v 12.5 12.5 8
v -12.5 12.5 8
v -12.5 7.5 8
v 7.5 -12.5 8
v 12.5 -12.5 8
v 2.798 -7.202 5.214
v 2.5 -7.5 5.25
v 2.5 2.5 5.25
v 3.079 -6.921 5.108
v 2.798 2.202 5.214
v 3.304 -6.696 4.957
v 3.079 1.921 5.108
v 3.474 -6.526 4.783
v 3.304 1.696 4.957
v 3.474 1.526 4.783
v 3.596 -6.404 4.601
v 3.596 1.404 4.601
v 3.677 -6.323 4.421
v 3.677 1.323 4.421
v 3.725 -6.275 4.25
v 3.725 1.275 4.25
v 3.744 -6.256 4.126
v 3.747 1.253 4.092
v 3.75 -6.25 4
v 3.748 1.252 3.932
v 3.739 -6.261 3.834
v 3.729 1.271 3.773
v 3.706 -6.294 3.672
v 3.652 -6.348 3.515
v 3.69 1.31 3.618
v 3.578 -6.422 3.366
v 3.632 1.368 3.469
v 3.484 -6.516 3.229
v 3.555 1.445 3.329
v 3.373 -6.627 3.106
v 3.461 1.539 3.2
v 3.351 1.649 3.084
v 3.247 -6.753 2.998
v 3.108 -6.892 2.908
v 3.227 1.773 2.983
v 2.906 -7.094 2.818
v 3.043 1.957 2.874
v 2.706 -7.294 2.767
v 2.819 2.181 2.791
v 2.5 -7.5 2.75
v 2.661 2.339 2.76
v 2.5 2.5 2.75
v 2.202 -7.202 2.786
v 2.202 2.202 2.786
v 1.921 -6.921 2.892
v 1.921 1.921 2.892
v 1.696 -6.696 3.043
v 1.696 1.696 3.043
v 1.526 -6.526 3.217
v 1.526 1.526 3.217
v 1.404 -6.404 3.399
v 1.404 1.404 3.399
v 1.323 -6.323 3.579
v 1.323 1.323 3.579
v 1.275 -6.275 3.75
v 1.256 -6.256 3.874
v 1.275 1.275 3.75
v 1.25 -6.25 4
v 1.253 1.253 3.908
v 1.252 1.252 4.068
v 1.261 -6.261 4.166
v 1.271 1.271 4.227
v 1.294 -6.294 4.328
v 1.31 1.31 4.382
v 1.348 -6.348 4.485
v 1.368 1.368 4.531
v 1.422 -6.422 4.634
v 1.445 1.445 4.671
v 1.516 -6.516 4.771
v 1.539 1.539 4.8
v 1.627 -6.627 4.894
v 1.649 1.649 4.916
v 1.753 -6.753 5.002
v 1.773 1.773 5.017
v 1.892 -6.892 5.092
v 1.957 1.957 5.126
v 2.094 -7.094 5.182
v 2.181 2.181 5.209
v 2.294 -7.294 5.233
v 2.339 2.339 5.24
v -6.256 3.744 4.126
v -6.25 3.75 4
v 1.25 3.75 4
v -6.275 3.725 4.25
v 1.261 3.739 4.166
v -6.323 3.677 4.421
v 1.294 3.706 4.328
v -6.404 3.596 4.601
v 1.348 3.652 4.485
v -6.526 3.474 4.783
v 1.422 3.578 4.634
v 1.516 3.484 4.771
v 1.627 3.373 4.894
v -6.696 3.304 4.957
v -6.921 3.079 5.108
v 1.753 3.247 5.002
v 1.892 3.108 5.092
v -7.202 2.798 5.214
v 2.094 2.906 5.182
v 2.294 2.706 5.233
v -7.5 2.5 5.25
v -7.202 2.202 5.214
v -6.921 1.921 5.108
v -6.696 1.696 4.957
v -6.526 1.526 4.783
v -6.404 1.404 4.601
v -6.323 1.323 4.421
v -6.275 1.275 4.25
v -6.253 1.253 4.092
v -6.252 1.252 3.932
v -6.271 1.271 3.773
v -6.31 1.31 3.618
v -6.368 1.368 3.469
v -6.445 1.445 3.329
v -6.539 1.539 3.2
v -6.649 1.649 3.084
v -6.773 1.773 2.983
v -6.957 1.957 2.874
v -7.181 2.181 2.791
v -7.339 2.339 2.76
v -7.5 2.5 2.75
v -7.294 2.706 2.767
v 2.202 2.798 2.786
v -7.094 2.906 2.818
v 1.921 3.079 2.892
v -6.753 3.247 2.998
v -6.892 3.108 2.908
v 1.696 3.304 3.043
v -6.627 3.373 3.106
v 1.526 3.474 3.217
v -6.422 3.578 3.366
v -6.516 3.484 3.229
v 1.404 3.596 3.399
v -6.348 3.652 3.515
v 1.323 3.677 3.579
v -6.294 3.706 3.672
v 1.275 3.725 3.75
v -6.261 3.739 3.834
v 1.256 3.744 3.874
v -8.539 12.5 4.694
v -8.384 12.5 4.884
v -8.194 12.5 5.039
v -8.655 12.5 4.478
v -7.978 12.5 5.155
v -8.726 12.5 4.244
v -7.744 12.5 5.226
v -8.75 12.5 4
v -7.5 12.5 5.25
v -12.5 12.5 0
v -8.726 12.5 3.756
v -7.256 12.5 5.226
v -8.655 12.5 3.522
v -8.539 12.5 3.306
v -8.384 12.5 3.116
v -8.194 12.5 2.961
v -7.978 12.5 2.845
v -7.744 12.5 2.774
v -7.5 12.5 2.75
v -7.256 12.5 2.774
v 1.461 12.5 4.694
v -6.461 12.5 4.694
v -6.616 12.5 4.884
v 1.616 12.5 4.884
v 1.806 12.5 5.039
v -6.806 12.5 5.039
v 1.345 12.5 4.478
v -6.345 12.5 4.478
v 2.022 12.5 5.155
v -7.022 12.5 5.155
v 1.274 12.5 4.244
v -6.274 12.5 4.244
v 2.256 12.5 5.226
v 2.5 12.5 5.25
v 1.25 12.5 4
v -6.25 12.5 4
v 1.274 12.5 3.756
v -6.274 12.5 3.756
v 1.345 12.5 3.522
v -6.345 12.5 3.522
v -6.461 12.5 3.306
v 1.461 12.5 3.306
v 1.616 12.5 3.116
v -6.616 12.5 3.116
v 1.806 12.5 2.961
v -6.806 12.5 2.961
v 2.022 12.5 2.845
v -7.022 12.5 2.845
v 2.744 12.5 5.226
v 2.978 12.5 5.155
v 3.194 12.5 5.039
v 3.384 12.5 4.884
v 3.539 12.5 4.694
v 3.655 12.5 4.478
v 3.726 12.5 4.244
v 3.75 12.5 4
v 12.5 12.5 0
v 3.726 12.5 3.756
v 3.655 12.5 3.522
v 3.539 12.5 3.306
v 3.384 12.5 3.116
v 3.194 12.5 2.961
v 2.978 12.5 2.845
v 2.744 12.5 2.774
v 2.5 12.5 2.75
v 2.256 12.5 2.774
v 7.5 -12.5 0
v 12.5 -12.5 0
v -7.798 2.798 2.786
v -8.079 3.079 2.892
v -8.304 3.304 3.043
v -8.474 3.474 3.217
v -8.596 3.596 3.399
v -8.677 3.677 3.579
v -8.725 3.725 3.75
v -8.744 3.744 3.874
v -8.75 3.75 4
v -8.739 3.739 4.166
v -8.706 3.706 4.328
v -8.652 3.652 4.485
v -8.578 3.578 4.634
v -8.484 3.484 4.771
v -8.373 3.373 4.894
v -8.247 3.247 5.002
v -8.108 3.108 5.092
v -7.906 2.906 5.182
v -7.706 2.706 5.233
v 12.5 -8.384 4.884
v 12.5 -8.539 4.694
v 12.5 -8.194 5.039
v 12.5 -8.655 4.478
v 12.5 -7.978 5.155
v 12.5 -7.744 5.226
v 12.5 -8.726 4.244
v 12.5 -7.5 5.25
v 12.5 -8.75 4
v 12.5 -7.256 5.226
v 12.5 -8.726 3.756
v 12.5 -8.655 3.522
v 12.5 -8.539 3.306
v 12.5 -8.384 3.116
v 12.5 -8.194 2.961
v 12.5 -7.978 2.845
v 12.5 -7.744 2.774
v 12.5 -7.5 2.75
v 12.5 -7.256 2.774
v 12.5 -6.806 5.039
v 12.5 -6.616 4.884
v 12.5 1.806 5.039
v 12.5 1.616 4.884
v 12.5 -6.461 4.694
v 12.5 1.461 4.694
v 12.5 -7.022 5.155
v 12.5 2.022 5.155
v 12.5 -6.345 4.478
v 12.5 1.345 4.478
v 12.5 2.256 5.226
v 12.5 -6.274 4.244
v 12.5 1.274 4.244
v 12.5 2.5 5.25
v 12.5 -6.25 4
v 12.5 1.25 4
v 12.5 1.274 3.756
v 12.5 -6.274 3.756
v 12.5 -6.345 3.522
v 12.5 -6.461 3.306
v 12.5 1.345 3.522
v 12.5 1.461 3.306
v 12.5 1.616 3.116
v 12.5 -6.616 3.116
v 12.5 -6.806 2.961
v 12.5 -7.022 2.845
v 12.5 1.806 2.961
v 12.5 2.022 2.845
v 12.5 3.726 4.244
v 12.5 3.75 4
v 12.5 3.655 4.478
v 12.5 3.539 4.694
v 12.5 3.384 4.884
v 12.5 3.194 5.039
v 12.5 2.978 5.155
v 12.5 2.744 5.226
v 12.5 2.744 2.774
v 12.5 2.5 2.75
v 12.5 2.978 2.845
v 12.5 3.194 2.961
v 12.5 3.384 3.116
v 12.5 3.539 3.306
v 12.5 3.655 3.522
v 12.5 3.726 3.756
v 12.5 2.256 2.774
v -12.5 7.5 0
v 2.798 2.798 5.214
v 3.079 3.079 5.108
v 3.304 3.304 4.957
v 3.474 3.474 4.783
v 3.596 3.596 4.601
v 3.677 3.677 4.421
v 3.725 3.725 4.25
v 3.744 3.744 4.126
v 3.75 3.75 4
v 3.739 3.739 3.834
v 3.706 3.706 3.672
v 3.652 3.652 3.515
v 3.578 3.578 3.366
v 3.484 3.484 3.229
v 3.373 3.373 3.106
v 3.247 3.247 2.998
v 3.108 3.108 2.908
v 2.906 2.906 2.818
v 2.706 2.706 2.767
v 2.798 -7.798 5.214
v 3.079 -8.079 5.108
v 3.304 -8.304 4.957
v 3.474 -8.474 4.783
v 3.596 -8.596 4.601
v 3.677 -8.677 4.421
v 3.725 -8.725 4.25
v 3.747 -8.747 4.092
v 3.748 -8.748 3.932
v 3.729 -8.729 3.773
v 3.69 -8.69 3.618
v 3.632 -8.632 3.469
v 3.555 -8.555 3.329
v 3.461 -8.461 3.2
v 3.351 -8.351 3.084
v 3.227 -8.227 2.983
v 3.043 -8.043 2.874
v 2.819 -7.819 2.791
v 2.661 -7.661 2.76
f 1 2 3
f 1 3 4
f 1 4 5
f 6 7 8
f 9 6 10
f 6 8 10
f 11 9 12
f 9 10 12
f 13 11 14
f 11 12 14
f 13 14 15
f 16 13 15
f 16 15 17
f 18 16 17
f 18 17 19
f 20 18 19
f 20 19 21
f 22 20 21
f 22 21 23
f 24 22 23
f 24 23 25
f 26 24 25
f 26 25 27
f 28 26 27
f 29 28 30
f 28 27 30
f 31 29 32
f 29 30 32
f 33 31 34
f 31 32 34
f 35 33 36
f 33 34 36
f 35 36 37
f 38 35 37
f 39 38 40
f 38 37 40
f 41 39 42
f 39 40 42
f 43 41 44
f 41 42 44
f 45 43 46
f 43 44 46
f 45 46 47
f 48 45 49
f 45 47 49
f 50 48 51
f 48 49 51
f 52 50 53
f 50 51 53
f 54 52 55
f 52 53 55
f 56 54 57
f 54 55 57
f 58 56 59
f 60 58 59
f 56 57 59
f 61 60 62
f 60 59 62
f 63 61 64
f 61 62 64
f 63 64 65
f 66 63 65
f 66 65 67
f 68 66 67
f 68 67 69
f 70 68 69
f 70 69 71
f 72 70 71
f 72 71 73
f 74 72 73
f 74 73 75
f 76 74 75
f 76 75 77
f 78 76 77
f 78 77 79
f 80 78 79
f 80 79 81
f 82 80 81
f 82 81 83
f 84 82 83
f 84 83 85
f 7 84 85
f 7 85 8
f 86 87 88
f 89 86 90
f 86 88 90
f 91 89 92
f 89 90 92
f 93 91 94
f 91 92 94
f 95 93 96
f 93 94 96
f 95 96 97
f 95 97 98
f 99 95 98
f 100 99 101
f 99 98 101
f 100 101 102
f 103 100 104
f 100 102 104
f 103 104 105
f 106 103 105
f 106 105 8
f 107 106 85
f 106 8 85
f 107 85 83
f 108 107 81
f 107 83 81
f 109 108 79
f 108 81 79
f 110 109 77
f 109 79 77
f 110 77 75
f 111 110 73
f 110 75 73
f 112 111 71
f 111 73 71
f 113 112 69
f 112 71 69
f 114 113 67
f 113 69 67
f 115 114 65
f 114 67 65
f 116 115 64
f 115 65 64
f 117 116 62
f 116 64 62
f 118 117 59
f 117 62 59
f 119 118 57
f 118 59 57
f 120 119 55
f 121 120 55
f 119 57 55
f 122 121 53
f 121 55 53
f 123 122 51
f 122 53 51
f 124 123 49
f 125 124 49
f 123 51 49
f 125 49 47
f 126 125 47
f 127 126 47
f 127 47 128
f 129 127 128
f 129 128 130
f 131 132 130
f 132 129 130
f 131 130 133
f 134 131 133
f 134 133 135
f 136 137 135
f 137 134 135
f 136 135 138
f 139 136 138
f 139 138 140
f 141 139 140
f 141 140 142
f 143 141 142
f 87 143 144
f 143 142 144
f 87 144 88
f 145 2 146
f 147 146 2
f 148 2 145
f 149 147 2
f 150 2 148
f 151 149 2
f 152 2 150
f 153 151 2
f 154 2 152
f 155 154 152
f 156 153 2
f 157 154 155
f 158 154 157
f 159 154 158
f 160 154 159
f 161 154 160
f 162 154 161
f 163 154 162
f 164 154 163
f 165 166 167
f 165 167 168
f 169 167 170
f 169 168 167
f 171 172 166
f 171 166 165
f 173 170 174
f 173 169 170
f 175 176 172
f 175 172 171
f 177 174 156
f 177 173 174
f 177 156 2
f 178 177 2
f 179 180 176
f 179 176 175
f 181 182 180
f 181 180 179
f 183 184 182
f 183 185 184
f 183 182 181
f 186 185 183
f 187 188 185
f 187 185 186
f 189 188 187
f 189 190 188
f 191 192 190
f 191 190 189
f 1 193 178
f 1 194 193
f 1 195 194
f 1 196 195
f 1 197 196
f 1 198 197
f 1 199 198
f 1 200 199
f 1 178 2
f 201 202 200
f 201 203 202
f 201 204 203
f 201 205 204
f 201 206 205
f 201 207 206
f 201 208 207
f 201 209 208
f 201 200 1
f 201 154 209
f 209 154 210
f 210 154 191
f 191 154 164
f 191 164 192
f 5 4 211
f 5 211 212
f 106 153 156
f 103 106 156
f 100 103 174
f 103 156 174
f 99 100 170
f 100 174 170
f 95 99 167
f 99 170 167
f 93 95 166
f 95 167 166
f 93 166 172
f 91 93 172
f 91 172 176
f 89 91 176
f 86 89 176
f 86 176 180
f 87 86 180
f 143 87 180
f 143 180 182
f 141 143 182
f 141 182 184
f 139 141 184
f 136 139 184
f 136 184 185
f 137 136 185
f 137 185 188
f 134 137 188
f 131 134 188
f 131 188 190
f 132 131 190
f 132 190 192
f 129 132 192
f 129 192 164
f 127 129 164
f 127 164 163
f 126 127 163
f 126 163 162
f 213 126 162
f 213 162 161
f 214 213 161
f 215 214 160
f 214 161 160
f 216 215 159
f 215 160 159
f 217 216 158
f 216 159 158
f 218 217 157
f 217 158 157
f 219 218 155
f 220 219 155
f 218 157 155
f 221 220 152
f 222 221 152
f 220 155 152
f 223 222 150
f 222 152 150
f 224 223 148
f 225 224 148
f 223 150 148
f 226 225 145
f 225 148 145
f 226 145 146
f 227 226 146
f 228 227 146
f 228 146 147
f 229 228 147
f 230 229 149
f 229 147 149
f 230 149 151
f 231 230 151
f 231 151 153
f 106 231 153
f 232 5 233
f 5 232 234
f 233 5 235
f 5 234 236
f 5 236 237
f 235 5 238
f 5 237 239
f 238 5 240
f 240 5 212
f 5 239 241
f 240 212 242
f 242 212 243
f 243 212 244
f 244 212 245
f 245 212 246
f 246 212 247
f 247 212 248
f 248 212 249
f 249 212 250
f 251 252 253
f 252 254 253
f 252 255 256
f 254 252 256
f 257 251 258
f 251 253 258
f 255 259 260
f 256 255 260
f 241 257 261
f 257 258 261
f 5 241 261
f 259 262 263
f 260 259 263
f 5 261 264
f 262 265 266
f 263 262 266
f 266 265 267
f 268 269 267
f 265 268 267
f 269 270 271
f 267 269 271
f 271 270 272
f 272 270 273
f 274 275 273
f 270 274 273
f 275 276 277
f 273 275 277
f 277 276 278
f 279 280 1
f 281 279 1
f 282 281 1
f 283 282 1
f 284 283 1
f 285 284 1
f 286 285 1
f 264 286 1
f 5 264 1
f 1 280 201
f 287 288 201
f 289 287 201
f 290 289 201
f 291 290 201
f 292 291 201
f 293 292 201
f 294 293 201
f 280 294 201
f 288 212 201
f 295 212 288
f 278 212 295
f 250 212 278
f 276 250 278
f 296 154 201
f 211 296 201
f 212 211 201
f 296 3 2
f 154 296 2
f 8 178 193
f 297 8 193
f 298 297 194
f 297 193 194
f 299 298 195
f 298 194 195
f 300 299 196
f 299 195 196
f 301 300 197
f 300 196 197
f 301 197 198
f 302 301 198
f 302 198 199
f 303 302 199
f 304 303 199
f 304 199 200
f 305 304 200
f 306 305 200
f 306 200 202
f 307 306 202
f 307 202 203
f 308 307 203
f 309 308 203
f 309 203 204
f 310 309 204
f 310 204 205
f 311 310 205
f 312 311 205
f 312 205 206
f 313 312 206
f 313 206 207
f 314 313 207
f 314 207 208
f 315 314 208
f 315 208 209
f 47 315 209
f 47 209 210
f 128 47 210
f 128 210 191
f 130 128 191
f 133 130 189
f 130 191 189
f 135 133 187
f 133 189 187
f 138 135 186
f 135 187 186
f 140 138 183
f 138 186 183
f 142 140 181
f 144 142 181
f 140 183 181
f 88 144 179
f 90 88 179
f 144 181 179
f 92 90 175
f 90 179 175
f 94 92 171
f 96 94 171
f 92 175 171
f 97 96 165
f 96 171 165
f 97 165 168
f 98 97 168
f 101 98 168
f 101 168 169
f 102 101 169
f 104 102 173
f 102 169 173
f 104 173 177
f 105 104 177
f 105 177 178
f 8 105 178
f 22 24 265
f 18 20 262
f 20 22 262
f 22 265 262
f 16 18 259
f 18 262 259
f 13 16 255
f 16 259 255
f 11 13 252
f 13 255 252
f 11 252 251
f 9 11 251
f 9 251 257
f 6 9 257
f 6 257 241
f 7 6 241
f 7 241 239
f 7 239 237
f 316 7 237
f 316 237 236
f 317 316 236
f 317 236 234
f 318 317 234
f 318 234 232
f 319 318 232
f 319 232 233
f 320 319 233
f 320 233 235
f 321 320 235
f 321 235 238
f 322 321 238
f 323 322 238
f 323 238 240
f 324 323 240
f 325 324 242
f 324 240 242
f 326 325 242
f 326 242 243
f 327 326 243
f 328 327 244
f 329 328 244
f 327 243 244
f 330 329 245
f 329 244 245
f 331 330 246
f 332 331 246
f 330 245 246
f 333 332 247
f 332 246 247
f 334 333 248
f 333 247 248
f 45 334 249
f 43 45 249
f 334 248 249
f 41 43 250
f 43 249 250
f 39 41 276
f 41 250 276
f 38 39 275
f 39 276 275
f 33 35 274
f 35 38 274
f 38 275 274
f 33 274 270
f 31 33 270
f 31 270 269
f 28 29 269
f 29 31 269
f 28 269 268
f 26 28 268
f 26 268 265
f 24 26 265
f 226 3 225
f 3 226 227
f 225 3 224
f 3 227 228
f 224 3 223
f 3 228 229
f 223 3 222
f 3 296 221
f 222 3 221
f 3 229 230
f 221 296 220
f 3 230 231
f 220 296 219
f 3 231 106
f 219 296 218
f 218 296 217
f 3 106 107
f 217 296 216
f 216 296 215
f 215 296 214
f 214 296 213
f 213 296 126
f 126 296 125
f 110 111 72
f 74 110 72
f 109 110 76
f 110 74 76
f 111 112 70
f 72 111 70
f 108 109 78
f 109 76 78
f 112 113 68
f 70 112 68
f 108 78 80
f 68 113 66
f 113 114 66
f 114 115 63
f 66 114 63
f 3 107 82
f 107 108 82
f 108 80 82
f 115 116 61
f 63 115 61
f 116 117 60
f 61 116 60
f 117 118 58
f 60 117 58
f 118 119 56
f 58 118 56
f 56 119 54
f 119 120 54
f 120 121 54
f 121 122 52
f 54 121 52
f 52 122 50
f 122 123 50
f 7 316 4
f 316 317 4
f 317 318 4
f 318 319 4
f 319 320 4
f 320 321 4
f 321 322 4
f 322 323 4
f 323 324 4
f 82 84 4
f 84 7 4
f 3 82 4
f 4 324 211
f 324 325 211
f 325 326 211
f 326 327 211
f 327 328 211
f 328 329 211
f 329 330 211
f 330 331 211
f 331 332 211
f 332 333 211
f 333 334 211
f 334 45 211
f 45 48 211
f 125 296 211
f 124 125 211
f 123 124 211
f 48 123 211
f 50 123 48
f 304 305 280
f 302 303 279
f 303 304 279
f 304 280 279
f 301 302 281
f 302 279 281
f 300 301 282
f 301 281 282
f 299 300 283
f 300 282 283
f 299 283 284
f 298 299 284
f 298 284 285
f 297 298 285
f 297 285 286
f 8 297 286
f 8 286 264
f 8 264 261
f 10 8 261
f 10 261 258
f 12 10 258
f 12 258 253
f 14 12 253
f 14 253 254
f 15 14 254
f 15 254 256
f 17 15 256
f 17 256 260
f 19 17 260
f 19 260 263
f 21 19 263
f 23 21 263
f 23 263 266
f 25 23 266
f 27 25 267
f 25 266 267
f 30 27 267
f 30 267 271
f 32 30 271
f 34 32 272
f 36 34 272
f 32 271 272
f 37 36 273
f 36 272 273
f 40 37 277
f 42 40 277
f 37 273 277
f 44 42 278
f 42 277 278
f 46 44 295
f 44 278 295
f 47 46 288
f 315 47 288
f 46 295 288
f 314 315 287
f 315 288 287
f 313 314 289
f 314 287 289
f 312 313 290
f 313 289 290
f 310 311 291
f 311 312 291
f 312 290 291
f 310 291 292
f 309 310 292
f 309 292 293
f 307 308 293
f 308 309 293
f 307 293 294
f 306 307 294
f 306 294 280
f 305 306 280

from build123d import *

# Parameters (mm, degrees)
SKETCH_1_W          = 25
SKETCH_1_H          = 25
EXTRUDE_1_DEPTH     = 8
SKETCH_2_R          = 1.25
CUT_EXTRUDE_1_DEPTH = 50
SKETCH_3_R          = 1.25
CUT_EXTRUDE_2_DEPTH = 50
CUT_EXTRUDE_4_DEPTH = 10


with BuildPart() as part:
    # Эскиз1 → Бобышка-Вытянуть1 (new body)
    with BuildSketch(Plane.XY):
        Rectangle(SKETCH_1_W, SKETCH_1_H)
    extrude(amount=EXTRUDE_1_DEPTH)

    # Эскиз2 → Вырез-Вытянуть1 (cut)
    with BuildSketch(Plane(origin=(0, 12.5, 0), x_dir=(1, 0, 0), z_dir=(0, 1, 0))):
        with Locations(Location((-7.5, -4, 0), (0, 0, 270))):
            Circle(SKETCH_2_R)
        with Locations(Location((2.5, -4, 0), (0, 0, 270))):
            Circle(SKETCH_2_R)
    extrude(amount=-CUT_EXTRUDE_1_DEPTH, mode=Mode.SUBTRACT)

    # Эскиз3 → Вырез-Вытянуть2 (cut)
    with BuildSketch(Plane(origin=(12.5, 0, 0), x_dir=(0, 0, -1), z_dir=(1, 0, 0))):
        with Locations(Location((-4, 2.5, 0), (0, 0, 90))):
            Circle(SKETCH_3_R)
        with Locations(Location((-4, -7.5, 0), (0, 0, 90))):
            Circle(SKETCH_3_R)
    extrude(amount=-CUT_EXTRUDE_2_DEPTH, mode=Mode.SUBTRACT)

    # Эскиз4 → Вырез-Вытянуть4 (cut)
    with BuildSketch(Plane(origin=(0, 0, 0), x_dir=(-1, 0, 0), z_dir=(0, 0, -1))):
        Polygon((12.5, 7.5), (-7.5, -12.5), (12.5, -12.5), align=None)
    extrude(amount=-CUT_EXTRUDE_4_DEPTH, mode=Mode.SUBTRACT)


solid = part.part
